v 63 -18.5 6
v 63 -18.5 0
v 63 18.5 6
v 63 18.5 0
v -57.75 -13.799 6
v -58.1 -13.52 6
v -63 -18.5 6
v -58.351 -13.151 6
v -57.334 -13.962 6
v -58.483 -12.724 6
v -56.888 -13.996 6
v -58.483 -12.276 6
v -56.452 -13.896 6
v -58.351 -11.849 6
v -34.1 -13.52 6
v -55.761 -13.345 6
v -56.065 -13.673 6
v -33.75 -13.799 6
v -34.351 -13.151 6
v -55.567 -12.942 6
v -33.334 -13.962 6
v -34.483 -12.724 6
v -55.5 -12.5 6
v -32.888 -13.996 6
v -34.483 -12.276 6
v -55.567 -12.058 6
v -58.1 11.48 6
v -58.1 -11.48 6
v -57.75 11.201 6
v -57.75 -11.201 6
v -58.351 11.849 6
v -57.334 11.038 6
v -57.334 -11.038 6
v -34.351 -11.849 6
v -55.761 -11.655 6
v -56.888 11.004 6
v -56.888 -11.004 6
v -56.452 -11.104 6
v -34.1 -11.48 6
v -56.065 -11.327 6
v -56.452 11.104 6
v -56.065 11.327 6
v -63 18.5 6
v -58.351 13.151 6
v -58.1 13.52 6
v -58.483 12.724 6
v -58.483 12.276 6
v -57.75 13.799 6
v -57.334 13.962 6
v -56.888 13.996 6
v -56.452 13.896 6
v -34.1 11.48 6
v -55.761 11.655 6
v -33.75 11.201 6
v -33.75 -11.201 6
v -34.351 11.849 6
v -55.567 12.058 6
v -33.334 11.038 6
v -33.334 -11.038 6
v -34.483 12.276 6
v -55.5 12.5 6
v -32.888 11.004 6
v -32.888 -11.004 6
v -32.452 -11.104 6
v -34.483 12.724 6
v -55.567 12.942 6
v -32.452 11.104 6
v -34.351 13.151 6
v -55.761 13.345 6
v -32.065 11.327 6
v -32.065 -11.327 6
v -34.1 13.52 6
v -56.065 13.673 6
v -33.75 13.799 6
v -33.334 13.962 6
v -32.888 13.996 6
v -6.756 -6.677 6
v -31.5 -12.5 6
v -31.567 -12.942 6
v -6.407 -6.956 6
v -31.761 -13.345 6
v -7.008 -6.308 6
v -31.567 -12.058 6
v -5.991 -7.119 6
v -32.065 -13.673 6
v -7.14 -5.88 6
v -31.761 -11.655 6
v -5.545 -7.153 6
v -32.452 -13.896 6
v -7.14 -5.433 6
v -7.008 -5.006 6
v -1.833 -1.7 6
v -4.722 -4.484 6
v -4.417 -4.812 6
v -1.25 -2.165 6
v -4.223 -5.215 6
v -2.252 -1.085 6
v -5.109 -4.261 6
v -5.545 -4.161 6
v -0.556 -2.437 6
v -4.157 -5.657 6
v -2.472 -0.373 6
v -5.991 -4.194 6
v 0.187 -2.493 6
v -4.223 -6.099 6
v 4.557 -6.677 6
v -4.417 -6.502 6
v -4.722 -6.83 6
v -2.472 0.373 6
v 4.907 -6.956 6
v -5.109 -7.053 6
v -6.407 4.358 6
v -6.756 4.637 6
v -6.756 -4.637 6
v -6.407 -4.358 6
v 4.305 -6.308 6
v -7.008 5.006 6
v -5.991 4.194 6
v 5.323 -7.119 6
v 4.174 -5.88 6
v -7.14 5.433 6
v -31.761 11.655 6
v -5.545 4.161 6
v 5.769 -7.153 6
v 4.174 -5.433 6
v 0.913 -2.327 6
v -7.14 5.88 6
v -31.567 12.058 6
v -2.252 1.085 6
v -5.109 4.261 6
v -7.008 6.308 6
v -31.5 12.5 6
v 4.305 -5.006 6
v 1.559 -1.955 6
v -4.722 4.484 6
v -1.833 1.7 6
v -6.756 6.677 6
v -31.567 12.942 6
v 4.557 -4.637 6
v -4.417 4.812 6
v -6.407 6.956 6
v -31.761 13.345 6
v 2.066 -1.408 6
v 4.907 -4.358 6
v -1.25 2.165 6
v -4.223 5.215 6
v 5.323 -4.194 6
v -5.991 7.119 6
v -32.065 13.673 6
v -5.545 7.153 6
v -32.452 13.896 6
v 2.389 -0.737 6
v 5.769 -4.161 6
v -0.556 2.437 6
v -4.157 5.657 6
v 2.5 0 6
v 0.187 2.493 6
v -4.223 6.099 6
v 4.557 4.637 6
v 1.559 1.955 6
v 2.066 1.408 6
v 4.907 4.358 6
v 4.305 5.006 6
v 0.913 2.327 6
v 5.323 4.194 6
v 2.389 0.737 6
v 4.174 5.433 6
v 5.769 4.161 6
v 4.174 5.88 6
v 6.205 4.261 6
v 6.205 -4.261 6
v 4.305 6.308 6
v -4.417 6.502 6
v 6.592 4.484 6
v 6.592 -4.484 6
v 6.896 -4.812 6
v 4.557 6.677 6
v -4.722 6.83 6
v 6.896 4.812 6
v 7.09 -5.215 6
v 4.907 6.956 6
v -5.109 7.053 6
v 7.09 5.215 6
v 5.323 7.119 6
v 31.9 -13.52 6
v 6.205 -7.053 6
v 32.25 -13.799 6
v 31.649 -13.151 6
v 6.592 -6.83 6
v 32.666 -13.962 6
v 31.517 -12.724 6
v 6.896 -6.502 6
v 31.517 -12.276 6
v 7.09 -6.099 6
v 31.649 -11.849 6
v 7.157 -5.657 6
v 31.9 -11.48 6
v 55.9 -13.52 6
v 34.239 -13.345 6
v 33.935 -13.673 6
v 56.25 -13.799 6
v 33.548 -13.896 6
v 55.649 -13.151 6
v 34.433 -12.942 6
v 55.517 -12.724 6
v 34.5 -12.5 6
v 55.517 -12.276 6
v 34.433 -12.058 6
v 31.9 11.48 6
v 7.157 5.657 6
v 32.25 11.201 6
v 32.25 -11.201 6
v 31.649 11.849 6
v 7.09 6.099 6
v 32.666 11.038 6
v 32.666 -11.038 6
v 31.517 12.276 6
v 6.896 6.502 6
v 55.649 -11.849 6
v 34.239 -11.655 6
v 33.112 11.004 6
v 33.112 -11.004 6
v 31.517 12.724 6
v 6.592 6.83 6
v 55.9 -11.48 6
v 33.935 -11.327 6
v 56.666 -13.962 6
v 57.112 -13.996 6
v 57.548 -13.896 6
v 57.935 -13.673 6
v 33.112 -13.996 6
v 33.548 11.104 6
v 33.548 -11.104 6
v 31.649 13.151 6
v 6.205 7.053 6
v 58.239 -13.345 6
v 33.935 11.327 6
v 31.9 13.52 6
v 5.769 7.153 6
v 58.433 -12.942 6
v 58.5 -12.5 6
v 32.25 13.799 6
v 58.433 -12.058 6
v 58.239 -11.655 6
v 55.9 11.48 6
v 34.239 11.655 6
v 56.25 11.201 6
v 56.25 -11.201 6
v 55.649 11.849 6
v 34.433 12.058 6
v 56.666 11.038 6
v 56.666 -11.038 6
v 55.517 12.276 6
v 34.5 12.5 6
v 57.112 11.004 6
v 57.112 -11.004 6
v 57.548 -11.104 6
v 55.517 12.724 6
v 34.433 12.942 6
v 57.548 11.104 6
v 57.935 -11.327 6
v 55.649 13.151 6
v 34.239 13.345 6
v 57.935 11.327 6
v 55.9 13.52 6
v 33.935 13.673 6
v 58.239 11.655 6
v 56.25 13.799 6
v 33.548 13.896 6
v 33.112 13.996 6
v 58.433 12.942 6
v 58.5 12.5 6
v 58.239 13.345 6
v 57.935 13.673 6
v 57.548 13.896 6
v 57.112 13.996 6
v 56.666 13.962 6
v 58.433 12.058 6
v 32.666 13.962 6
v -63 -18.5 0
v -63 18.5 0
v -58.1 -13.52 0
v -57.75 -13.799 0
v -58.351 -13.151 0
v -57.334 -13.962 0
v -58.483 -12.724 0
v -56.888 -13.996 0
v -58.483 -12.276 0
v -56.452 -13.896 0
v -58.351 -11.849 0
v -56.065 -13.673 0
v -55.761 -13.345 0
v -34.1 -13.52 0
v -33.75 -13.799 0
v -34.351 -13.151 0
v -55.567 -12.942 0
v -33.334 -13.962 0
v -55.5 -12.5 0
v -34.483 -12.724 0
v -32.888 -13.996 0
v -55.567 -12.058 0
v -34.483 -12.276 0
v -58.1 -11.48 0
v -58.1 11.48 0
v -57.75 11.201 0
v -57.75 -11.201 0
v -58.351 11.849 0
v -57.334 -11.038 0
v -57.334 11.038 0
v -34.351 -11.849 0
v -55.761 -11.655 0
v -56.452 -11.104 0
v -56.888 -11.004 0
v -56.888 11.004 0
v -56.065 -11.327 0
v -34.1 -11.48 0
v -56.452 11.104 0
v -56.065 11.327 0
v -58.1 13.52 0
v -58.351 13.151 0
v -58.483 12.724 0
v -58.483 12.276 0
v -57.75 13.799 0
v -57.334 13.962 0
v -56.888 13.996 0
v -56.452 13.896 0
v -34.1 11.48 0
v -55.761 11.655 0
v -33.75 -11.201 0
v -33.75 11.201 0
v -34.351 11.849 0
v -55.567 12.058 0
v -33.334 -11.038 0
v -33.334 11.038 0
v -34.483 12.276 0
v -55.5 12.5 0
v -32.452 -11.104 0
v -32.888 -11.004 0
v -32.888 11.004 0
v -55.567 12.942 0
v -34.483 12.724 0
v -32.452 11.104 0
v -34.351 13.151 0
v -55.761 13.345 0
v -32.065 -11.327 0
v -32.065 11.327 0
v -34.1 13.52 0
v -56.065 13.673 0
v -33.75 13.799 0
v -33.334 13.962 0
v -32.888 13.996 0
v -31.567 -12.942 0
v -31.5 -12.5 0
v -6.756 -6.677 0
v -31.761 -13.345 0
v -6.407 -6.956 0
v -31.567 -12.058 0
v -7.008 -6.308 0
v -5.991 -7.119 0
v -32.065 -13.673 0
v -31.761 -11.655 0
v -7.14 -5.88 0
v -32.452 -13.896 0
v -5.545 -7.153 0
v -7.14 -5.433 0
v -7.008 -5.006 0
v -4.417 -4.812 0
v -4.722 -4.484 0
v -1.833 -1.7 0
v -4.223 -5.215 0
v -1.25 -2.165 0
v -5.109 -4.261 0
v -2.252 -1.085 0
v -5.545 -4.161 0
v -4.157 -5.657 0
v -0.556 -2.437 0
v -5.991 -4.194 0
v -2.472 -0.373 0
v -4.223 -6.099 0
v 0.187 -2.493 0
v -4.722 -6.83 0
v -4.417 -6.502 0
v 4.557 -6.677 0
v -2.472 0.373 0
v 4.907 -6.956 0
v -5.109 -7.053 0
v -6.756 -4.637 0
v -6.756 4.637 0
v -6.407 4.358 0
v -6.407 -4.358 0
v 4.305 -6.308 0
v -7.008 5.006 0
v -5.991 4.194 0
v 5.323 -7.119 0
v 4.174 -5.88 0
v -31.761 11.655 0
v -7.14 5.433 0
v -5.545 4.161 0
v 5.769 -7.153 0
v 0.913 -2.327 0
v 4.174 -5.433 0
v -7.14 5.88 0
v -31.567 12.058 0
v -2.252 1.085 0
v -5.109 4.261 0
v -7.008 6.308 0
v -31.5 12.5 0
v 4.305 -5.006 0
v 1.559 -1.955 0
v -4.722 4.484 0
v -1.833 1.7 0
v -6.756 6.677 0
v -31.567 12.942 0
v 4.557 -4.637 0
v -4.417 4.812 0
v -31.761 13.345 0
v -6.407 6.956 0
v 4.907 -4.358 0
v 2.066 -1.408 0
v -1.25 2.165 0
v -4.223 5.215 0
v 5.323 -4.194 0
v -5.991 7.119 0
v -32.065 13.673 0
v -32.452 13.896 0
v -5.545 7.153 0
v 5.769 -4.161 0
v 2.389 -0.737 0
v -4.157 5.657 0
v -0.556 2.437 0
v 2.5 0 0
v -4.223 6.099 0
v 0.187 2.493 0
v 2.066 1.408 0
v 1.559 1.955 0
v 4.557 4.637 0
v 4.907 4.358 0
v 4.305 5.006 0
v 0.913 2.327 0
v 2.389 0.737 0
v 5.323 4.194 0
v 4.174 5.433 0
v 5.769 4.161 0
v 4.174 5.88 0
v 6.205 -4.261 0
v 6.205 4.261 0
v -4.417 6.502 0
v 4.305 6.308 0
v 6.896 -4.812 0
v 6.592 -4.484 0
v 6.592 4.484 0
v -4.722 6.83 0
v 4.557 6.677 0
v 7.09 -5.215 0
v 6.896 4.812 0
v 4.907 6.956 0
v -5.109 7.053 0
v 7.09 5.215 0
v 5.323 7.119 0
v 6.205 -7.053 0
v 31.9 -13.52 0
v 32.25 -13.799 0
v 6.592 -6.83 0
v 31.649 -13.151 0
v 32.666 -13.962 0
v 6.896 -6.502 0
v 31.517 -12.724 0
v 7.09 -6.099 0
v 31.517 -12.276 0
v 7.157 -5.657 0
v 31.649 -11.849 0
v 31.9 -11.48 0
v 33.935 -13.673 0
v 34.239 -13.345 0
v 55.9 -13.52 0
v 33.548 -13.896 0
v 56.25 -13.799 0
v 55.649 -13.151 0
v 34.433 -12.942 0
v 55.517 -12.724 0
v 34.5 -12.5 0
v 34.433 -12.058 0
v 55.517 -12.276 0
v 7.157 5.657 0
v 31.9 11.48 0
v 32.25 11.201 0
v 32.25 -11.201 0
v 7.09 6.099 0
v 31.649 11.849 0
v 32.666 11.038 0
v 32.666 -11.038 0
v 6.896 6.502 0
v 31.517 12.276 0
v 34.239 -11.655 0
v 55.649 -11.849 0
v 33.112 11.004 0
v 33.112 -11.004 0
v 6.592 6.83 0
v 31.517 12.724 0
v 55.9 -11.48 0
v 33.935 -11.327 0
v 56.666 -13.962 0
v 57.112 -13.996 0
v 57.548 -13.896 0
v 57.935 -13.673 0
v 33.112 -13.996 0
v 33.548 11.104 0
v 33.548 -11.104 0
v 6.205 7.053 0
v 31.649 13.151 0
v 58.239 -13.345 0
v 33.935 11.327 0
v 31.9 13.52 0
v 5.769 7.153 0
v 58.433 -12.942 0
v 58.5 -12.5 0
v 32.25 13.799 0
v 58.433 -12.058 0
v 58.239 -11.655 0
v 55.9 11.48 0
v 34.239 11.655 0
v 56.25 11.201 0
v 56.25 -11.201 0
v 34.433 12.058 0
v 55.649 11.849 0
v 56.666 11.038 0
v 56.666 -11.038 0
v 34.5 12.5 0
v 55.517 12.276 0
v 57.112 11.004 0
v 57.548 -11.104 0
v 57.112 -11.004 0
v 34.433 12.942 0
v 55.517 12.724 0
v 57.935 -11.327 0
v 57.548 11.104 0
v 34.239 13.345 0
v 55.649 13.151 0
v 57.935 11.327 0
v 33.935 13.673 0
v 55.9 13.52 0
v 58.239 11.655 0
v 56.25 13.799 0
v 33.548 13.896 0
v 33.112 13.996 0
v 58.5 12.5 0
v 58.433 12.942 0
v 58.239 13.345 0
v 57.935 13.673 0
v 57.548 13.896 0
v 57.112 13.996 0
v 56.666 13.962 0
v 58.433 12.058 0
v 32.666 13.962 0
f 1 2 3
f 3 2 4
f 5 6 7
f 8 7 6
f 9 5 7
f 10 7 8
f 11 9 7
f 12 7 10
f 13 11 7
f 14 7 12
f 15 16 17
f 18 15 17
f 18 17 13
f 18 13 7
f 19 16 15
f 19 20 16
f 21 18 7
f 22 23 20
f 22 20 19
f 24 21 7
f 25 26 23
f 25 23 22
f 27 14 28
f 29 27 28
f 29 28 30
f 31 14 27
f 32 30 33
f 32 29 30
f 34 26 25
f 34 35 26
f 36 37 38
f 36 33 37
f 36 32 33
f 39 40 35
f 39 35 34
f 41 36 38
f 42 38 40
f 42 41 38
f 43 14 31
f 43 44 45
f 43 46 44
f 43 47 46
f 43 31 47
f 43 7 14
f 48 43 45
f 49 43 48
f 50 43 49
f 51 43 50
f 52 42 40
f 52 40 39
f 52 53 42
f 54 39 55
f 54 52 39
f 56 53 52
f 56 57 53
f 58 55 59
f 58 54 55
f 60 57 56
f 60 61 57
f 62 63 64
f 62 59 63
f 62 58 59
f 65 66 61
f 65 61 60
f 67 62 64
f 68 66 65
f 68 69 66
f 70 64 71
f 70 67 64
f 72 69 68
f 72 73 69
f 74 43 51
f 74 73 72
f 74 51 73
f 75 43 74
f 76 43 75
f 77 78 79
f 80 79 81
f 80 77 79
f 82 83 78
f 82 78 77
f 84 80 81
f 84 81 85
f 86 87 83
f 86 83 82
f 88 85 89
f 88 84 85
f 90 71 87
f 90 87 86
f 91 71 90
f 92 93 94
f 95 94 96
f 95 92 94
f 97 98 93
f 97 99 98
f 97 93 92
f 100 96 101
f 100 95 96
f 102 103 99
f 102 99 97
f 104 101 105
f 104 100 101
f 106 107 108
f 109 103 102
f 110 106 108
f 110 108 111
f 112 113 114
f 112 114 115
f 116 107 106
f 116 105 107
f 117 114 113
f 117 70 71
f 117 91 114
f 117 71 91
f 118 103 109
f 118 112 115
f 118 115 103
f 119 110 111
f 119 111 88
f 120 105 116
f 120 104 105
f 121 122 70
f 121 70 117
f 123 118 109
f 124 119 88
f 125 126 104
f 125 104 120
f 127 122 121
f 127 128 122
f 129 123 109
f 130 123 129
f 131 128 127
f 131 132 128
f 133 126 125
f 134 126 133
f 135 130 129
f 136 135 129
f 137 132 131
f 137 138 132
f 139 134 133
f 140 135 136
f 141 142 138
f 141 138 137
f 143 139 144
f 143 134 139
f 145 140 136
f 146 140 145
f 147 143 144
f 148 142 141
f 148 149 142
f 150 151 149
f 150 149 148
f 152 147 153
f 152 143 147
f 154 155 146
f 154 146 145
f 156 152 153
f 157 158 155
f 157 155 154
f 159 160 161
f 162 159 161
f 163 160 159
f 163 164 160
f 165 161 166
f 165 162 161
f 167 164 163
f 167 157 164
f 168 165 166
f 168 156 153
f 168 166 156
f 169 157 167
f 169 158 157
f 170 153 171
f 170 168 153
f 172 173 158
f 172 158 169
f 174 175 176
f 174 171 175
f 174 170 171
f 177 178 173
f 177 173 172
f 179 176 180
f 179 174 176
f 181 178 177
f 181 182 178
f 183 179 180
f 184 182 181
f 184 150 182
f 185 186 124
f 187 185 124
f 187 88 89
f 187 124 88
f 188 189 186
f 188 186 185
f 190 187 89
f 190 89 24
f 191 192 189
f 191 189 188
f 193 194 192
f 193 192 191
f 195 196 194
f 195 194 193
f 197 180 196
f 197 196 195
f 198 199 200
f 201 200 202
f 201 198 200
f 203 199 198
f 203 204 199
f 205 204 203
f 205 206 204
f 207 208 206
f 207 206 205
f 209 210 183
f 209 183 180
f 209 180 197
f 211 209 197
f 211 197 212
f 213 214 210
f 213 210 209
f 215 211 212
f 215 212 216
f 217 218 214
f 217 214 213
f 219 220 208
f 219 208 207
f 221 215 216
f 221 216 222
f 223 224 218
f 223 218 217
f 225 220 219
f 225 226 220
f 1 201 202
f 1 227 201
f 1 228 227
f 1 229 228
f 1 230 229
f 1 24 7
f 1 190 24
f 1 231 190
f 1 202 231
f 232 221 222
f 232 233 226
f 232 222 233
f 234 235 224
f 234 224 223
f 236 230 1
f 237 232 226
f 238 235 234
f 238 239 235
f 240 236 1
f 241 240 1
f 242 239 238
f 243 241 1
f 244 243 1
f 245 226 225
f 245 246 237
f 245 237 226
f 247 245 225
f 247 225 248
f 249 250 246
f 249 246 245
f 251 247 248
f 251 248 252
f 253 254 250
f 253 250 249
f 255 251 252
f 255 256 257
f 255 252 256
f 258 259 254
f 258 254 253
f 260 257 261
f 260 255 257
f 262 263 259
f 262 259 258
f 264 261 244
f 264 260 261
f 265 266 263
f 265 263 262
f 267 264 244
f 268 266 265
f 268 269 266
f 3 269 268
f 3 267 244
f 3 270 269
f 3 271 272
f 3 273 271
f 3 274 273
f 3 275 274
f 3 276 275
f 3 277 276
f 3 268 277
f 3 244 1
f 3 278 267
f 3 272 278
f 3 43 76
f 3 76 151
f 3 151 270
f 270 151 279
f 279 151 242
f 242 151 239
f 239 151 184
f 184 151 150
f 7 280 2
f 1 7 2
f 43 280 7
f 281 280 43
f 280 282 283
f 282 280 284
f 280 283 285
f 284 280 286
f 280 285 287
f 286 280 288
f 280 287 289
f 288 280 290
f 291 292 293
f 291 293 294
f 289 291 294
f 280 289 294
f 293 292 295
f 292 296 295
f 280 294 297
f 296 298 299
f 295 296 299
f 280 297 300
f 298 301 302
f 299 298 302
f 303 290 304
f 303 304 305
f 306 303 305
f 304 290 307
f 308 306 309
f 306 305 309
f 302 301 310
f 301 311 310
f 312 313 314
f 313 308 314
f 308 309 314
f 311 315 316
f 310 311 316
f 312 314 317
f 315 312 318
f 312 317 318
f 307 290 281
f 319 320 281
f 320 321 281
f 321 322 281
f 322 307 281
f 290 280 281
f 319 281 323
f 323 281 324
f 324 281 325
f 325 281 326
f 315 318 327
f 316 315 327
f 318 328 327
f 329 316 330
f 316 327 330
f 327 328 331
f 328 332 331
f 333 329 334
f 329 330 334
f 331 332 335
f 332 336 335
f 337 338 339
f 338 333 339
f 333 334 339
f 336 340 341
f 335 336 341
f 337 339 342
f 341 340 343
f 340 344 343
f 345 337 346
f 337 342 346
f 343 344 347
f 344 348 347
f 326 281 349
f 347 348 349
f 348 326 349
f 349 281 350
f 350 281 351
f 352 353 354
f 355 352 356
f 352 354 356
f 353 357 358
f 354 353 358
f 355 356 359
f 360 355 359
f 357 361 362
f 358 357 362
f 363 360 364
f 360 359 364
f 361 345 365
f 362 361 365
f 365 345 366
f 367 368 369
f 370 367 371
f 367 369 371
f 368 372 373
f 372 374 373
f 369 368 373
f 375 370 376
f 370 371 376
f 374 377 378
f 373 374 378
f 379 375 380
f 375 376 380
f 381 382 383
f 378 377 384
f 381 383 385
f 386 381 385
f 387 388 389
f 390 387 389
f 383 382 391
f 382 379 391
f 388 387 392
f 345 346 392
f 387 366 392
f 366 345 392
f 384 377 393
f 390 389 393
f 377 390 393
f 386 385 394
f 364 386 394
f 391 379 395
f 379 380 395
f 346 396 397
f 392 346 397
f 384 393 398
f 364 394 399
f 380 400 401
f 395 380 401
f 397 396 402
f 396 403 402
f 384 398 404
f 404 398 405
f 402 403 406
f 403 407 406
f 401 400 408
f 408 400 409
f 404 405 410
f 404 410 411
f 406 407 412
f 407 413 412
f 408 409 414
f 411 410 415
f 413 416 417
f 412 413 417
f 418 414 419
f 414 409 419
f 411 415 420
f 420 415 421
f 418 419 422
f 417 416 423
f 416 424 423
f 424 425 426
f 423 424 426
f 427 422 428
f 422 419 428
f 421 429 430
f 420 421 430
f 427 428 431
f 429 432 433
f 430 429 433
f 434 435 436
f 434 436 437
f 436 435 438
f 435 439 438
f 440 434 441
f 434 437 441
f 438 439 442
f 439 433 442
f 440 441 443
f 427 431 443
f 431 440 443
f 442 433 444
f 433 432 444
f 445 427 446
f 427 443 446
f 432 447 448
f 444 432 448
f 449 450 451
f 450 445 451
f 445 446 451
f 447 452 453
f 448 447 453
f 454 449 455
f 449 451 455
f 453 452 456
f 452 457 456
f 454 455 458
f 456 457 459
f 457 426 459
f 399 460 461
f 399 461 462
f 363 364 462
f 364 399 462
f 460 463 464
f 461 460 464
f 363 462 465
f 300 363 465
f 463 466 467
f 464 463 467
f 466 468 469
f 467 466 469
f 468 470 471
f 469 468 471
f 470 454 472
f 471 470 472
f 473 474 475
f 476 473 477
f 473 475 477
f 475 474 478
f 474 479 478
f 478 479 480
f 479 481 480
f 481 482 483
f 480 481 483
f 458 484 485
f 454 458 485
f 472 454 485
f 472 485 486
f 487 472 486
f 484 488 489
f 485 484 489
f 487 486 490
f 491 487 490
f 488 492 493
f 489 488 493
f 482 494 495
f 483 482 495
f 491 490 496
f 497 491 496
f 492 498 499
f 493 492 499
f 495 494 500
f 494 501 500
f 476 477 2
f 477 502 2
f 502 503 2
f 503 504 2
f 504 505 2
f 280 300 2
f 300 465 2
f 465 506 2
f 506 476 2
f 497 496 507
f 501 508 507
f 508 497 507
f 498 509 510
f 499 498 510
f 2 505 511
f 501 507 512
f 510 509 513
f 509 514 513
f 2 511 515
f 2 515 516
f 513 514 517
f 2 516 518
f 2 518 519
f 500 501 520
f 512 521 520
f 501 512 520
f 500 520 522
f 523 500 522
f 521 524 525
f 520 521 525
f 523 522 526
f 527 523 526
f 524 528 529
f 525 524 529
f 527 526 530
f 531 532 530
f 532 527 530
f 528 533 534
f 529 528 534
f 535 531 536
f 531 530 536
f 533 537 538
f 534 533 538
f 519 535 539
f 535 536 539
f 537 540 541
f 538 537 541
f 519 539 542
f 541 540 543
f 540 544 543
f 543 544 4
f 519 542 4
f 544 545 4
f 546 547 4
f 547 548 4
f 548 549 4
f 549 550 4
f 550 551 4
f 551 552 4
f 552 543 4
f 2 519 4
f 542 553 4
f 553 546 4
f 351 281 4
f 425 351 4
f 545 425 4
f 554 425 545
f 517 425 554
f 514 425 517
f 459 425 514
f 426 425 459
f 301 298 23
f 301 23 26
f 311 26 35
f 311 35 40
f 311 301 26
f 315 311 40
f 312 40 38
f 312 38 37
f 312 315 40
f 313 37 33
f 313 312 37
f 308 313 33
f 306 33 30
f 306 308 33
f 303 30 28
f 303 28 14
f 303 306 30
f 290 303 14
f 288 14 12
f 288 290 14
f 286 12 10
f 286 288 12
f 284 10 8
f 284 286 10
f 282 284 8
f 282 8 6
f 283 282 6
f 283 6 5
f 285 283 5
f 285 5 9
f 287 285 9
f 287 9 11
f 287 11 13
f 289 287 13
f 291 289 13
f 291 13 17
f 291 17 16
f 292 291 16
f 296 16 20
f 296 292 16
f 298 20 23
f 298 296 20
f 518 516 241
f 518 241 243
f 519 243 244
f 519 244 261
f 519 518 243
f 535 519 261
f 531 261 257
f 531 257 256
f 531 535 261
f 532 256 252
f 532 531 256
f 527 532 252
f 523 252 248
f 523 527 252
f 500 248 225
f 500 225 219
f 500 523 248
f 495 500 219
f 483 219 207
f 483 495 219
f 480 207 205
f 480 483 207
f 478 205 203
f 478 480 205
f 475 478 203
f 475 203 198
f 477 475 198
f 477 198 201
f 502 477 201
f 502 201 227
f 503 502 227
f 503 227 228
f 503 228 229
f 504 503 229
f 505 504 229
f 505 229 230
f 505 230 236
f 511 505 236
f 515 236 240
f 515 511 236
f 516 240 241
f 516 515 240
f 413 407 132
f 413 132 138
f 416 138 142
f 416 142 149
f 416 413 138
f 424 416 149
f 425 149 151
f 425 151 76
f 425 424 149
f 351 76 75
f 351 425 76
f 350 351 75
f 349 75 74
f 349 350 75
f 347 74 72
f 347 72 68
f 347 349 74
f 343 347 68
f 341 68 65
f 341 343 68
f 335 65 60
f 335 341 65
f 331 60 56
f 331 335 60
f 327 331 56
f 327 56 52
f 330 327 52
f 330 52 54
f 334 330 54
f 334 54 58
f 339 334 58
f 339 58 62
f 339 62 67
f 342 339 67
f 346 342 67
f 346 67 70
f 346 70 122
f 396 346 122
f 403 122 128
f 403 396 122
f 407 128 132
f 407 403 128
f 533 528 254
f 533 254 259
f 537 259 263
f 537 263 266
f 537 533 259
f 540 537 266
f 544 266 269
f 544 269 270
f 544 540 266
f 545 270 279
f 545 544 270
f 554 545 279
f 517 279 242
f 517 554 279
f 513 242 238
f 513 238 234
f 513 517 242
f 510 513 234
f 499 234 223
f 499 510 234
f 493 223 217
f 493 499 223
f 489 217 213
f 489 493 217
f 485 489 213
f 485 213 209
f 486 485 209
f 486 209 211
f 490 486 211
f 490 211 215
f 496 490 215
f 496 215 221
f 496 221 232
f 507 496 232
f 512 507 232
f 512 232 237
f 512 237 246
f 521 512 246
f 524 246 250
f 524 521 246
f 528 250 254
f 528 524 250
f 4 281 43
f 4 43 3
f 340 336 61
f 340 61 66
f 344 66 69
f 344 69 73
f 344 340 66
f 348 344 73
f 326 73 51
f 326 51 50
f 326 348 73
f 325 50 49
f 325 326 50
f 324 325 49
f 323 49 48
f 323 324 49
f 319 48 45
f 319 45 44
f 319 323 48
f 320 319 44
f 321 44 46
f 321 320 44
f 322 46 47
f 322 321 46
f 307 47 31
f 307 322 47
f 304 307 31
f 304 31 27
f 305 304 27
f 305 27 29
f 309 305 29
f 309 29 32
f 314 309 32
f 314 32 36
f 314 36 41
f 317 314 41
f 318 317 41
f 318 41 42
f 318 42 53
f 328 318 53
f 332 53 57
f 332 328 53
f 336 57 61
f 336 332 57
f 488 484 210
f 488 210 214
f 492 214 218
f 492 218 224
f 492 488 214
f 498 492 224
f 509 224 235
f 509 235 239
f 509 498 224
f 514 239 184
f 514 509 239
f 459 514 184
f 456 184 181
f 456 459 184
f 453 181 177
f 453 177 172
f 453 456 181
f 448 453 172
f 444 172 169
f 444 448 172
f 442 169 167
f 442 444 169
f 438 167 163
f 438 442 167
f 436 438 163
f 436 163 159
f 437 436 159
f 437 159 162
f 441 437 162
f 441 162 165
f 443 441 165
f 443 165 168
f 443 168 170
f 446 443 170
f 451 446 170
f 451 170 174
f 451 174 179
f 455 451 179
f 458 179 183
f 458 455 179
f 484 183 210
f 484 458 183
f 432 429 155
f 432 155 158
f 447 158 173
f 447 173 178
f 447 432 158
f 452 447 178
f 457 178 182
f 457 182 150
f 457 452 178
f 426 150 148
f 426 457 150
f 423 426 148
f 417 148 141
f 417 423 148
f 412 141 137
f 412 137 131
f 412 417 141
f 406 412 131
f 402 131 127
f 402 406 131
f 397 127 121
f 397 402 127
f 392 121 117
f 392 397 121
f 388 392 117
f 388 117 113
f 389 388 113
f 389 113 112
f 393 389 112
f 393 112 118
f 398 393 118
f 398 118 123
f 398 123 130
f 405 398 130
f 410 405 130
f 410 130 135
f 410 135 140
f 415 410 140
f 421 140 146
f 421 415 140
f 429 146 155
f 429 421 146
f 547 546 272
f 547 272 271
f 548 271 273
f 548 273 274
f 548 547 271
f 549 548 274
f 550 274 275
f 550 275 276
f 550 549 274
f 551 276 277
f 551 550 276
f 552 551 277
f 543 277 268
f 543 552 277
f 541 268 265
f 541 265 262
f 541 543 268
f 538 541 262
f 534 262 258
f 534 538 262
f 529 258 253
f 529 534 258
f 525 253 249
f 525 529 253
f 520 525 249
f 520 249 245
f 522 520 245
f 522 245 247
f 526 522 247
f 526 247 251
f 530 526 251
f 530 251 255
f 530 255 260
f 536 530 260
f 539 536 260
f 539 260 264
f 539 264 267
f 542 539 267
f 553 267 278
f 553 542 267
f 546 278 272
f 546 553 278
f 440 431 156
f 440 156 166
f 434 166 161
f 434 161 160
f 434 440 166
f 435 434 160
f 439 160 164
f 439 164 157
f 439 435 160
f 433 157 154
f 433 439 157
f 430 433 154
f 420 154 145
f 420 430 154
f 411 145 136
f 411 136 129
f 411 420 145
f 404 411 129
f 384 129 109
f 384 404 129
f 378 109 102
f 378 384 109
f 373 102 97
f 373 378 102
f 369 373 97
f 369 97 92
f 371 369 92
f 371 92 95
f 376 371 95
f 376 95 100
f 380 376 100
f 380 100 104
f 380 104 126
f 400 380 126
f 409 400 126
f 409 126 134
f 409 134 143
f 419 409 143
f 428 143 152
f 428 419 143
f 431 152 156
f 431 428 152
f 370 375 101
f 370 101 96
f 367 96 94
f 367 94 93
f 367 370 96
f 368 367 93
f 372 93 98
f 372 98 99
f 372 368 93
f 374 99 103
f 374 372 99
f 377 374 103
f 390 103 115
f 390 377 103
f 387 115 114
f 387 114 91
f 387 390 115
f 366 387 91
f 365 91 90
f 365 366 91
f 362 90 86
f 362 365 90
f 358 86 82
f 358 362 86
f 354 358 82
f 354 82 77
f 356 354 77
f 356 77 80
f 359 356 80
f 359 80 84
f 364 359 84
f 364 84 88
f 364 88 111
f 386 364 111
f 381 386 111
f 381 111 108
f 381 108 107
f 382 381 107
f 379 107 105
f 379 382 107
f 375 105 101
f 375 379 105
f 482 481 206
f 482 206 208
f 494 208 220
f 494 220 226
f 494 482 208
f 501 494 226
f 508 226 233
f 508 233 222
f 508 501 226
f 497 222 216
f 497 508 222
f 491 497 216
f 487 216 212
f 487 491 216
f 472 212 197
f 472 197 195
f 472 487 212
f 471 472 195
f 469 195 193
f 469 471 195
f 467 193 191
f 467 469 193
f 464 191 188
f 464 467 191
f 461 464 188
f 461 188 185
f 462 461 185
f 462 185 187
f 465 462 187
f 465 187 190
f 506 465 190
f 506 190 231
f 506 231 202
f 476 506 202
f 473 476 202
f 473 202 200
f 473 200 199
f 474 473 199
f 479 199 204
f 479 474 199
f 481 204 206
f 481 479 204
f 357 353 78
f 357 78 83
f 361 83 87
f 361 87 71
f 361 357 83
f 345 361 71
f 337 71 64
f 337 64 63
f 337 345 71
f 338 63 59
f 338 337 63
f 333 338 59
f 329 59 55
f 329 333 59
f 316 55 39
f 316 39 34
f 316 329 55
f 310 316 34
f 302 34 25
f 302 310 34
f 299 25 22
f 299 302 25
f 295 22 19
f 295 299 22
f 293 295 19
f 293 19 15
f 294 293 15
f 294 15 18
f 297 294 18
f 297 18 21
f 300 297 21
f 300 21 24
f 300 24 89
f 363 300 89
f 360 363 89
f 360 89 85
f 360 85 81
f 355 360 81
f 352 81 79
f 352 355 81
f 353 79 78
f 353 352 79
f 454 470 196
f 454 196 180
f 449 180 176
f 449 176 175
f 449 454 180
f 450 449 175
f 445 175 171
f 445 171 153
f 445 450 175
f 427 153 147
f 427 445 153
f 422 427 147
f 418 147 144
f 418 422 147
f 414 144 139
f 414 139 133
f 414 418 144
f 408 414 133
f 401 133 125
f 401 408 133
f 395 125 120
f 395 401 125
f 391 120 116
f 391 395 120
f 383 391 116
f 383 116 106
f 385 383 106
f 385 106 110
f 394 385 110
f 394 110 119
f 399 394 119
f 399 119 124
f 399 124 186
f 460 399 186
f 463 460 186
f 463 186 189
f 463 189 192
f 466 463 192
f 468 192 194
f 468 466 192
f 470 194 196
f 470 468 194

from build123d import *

# Parameters (mm, degrees)
SKETCH_1_W      = 126
SKETCH_1_H      = 37
SKETCH_1_R      = 1.5
SKETCH_1_R_2    = 2.5
EXTRUDE_1_DEPTH = 6


with BuildPart() as part:
    # 草图1 → 凸台-拉伸1 (new body)
    with BuildSketch(Plane.XY):
        Rectangle(SKETCH_1_W, SKETCH_1_H)
        with Locations((-57, 12.5)):
            Circle(SKETCH_1_R, mode=Mode.SUBTRACT)
        with Locations((-33, 12.5)):
            Circle(SKETCH_1_R, mode=Mode.SUBTRACT)
        with Locations((-57, -12.5)):
            Circle(SKETCH_1_R, mode=Mode.SUBTRACT)
        with Locations((-33, -12.5)):
            Circle(SKETCH_1_R, mode=Mode.SUBTRACT)
        with Locations((33, 12.5)):
            Circle(SKETCH_1_R, mode=Mode.SUBTRACT)
        with Locations((57, 12.5)):
            Circle(SKETCH_1_R, mode=Mode.SUBTRACT)
        with Locations((57, -12.5)):
            Circle(SKETCH_1_R, mode=Mode.SUBTRACT)
        with Locations((33, -12.5)):
            Circle(SKETCH_1_R, mode=Mode.SUBTRACT)
        with Locations((-5.656854249, 5.656854249)):
            Circle(SKETCH_1_R, mode=Mode.SUBTRACT)
        with Locations((5.656854249, 5.656854249)):
            Circle(SKETCH_1_R, mode=Mode.SUBTRACT)
        with Locations((-5.656854249, -5.656854249)):
            Circle(SKETCH_1_R, mode=Mode.SUBTRACT)
        with Locations((5.656854249, -5.656854249)):
            Circle(SKETCH_1_R, mode=Mode.SUBTRACT)
        Circle(SKETCH_1_R_2, mode=Mode.SUBTRACT)
    extrude(amount=EXTRUDE_1_DEPTH)


solid = part.part
